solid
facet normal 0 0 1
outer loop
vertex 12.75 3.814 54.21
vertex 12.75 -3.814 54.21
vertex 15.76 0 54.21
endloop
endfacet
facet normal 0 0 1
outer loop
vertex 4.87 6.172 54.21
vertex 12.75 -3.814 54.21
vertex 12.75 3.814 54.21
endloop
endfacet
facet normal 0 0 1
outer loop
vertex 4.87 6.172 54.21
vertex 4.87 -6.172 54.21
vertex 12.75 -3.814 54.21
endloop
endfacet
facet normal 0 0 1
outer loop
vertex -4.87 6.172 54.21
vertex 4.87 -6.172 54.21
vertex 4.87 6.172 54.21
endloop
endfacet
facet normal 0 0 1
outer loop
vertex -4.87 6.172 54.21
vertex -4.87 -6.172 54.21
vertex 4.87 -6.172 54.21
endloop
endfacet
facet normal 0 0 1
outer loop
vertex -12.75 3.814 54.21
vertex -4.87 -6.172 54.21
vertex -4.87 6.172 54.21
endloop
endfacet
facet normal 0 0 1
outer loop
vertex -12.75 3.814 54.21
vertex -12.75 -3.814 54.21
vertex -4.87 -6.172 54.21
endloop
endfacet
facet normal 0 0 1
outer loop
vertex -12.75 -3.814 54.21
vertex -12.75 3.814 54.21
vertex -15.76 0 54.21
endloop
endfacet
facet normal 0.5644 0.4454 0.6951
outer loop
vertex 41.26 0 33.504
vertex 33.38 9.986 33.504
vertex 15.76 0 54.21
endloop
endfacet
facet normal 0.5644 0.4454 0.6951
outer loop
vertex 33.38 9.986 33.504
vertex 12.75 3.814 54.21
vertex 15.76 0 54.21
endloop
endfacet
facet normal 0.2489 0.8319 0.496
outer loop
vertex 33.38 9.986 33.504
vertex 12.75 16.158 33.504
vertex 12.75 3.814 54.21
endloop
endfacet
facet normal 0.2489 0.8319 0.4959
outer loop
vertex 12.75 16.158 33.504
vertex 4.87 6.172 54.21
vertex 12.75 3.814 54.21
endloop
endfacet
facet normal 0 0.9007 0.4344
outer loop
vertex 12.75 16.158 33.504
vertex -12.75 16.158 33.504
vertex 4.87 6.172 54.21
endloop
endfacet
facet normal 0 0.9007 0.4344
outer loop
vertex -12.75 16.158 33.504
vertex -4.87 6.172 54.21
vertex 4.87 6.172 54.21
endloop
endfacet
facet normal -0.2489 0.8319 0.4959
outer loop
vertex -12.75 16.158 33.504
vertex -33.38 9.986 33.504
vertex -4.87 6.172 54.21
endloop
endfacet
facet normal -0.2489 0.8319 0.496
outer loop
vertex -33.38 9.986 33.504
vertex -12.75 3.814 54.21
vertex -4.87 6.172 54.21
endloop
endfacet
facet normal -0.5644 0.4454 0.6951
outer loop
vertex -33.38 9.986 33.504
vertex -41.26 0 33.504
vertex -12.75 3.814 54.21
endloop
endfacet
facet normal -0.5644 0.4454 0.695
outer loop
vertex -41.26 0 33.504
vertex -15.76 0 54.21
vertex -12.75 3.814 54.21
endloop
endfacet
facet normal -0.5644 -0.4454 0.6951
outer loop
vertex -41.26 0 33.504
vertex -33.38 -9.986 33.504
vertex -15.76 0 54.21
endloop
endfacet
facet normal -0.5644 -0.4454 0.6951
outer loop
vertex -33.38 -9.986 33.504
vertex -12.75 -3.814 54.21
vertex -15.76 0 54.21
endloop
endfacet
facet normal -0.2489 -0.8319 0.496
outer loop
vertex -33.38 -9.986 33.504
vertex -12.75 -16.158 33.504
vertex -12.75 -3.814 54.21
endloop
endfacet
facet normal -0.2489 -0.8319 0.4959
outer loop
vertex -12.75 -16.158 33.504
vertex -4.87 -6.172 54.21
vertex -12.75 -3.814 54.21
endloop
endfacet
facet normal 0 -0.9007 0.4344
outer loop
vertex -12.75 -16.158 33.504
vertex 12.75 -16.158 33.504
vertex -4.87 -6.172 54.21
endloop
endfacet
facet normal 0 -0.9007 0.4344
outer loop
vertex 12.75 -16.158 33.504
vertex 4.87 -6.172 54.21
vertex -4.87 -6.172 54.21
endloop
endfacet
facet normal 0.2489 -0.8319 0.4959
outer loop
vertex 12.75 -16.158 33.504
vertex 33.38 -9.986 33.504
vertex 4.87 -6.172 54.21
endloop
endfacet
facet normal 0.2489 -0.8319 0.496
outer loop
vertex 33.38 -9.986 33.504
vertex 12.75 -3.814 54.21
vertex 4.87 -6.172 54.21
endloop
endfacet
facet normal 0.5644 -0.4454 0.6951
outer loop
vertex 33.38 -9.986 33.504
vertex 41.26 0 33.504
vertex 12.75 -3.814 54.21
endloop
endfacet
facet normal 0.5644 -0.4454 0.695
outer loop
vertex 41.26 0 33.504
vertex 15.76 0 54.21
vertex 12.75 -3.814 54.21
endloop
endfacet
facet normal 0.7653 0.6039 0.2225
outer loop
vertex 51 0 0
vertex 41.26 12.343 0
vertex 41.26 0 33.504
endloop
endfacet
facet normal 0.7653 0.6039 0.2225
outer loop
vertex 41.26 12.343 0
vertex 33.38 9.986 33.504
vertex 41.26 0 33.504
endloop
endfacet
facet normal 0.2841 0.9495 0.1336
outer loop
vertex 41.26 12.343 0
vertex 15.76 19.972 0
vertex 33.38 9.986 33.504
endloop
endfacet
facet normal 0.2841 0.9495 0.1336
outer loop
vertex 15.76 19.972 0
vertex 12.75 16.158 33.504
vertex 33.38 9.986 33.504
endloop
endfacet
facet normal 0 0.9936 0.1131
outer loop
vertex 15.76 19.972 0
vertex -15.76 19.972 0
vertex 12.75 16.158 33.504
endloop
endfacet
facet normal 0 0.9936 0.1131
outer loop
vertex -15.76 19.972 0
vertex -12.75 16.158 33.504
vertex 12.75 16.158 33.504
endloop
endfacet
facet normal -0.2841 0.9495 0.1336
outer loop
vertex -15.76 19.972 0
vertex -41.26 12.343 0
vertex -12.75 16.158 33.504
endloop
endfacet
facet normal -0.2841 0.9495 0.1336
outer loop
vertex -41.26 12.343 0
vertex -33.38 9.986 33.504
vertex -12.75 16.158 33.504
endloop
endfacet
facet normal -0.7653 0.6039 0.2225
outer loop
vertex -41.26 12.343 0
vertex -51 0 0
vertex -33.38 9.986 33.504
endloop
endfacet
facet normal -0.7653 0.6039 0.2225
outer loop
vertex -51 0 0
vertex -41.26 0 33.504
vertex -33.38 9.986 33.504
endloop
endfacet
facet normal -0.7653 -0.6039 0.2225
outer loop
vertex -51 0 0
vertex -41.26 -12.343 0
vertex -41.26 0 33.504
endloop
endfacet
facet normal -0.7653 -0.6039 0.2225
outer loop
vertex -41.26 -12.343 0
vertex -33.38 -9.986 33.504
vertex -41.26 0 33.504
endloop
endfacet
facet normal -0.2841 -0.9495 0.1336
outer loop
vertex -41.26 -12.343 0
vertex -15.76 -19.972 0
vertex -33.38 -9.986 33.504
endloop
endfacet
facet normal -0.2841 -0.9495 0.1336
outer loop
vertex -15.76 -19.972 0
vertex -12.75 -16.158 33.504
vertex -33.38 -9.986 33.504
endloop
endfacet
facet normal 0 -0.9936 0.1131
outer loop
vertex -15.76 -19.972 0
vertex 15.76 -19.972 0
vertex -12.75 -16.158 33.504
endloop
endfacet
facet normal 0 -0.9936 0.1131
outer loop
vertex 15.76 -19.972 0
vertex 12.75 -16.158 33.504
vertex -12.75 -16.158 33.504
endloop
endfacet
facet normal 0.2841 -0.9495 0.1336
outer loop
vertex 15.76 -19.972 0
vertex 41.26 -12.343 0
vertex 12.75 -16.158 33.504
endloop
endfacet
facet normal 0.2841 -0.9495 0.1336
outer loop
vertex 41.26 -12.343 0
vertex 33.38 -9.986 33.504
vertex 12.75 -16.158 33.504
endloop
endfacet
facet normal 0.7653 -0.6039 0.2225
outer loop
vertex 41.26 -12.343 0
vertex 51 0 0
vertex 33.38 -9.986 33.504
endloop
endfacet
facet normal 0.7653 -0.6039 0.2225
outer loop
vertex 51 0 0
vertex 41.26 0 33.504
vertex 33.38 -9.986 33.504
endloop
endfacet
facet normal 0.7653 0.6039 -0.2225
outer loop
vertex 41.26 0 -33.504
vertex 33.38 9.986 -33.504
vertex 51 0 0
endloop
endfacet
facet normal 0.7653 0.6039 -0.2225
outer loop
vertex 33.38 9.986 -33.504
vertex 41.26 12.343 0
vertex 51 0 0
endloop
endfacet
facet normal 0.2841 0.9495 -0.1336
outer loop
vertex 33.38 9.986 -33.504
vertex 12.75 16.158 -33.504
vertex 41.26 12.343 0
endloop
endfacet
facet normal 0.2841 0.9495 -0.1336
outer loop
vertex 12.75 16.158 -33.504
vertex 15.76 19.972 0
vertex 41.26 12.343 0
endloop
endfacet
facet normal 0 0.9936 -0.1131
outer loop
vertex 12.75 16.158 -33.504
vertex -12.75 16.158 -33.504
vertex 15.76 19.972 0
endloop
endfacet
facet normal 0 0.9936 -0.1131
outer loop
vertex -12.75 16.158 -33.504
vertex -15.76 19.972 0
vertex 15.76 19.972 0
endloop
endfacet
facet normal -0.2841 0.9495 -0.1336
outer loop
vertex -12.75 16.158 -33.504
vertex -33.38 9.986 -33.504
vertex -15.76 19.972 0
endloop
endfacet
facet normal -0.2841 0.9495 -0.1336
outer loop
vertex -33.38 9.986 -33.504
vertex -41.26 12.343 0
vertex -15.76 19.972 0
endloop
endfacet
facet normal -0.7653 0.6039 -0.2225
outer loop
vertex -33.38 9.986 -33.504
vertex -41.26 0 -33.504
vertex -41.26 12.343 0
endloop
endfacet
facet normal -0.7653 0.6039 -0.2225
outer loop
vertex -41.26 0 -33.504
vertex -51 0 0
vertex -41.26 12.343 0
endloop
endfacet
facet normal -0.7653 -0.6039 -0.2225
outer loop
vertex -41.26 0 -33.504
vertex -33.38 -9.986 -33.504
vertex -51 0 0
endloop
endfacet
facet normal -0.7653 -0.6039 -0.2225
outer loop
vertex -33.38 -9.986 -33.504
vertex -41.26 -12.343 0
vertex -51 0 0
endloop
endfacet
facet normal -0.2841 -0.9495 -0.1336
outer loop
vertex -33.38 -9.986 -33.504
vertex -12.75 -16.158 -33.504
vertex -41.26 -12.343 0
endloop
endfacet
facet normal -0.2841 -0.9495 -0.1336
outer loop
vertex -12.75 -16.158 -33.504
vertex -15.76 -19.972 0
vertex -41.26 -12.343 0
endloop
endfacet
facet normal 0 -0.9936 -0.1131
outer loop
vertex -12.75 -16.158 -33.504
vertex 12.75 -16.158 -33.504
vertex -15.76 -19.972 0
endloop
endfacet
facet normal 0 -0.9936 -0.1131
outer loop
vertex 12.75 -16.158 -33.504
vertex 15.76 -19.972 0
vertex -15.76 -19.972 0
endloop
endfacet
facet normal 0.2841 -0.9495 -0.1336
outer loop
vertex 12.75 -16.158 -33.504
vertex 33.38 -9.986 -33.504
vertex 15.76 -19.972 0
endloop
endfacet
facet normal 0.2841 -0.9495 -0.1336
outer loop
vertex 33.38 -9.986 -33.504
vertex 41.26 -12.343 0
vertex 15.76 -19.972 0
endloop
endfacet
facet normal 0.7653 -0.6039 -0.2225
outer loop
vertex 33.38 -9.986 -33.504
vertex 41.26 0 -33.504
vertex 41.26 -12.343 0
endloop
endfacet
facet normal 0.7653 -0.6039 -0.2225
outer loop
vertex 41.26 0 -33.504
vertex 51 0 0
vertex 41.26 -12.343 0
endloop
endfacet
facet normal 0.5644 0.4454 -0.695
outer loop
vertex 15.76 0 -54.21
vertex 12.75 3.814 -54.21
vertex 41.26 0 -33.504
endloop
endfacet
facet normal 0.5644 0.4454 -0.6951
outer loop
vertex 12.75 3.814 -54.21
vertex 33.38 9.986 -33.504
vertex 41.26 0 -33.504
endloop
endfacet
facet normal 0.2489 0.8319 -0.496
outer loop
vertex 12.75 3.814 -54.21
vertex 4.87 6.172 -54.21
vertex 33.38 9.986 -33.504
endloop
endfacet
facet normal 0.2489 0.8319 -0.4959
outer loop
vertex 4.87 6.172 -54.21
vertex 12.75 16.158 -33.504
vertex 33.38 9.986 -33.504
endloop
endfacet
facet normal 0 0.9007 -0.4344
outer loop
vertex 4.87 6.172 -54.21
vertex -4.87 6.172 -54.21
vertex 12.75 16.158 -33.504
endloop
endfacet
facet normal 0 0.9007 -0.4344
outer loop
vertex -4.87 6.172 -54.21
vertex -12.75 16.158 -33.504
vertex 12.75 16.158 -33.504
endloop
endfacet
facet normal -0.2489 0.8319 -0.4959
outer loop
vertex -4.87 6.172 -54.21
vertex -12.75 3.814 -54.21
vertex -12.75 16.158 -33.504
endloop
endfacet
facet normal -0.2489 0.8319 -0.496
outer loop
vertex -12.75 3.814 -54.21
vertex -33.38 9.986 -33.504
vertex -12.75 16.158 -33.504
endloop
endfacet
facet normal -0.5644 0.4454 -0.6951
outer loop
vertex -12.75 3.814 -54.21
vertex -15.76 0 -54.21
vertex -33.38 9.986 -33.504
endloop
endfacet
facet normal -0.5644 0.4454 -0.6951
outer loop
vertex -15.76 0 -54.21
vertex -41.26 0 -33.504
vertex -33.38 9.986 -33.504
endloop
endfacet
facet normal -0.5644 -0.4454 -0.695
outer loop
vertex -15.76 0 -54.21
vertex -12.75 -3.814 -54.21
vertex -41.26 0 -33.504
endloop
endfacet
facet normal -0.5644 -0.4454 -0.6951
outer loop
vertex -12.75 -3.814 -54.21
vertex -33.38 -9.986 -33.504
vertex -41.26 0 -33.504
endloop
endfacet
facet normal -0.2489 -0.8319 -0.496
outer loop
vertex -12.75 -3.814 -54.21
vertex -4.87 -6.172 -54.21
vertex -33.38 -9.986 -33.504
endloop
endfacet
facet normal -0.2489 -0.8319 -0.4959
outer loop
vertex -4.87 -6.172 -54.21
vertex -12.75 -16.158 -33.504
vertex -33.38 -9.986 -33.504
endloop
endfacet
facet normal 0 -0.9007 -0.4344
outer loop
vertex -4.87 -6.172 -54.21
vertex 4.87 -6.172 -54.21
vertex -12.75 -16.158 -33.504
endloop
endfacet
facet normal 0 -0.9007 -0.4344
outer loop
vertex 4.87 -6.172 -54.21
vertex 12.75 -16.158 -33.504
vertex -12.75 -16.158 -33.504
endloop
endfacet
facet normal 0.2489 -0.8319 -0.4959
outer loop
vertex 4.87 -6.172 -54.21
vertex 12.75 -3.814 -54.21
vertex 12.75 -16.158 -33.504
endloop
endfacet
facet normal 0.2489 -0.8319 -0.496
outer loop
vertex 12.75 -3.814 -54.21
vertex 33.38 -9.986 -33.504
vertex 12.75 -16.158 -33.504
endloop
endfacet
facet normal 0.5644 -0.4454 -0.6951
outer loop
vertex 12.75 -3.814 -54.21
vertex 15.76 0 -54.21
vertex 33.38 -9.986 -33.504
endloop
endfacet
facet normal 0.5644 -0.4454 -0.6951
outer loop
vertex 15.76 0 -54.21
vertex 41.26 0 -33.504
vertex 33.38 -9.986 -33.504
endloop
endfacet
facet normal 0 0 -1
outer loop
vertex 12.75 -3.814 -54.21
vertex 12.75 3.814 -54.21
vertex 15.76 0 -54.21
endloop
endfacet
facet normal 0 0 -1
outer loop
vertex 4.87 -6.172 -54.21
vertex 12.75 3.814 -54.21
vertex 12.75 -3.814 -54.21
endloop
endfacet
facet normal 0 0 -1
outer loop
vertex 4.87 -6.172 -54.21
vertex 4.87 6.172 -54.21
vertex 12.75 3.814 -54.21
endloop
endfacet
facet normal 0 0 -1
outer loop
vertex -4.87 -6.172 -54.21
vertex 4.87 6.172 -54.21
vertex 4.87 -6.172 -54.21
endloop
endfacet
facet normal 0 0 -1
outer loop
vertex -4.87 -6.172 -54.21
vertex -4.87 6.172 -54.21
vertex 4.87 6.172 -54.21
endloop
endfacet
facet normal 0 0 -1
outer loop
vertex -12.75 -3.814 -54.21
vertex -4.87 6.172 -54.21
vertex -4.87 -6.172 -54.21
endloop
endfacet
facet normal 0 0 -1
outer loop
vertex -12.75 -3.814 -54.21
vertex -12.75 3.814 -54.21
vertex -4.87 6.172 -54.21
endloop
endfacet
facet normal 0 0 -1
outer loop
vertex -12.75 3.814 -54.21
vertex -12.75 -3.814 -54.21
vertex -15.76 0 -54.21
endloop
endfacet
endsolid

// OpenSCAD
// Generated by SolidPython 1.0.1 on 2020-07-29 00:46:52


scale(v = [17, 7, 19]) {
	sphere(r = 3);
}
/***********************************************
*********      SolidPython code:      **********
************************************************
 
# import packages: SolidPython
from solid import *
from solid.utils import *
from itertools import chain, combinations, permutations


class Resize:

    def __init__(self, scad_file):
        self.scad_file = scad_file
        #self.scad_file = import_scad(scad_file)
        # cone/cylinder param:
        self.r1 = 0
        self.r2 = 0
        self.h = 0
        # rectangular prism param:
        self.w = 0
        self.l = 0
        # ellipse param:
        self.r = 0

    # import OpenScad code (file name corresponds to shape)


    # classify shape + parameters
    def assign(self, param1, param2, param3):
        if self.scad_file == 'cone.scad':
            self.r1 = param1
            self.r2 = param2
            self.h = param3
        elif self.scad_file == 'cylinder.scad':
            self.r1 = param1
            self.r2 = param2
            self.h = param3
        elif self.scad_file == 'rectangularPrism.scad':
            self.h = param1
            self.l = param2
            self.w = param3
        else:
            self.r = param1
            self.h = param2

    # resize parameters
    def iterate(self):
        x = range(3, 20, 2)
        i = 1
        if self.scad_file == 'cone.scad':
            tempList = list(permutations(x, 2))
            for temp in tempList:
                param1 = temp[0]
                param2 = temp[1]
                filepath = 'produced_scad_files/' + 'cone' + str(param1) + '_' + str(param2) + '_' + '.scad'
                scad_render_to_file(cylinder(h=param1, r1=param2, r2=0), filepath)

        elif self.scad_file == 'cylinder.scad':
            tempList = list(permutations(x, 3))
            for temp in tempList:
                param1 = temp[0]
                param2 = temp[1]
                filepath = 'produced_scad_files/' + 'cylinder' + str(param1) + '_' + str(param2) + '_' + '.scad'
                scad_render_to_file(cylinder(h=param1, r1=param2, r2=param2), filepath)

        elif self.scad_file == 'rectangularPrism.scad':
            tempList = list(permutations(x, 3))
            for temp in tempList:
                param1 = temp[0]
                param2 = temp[1]
                param3 = temp[2]
                filepath = 'produced_scad_files/' + 'rectangularPrism' + str(param1) + '_' + str(param2) + '_' + str(
                    param3) + '.scad'
                scad_render_to_file(cube(size=(param1, param2, param3)), filepath)

        elif self.scad_file == 'ellipse.scad':
            tempList = list(permutations(x, 4))
            for temp in tempList:
                param1 = temp[0]
                param2 = temp[1]
                param3 = temp[2]
                param4 = temp[3]
                filepath = 'produced_scad_files/' + 'ellipse' + str(param1) + '_' + str(param2) + '_' + str(param3) + '_' + str(param4) + '.scad'
                scad_render_to_file(scale([param1, param2, param3])(sphere(r=param4)), filepath)

    def render_to_scadfile(self):
        scad_render_to_file(scad, 'example.scad') 
 
************************************************/
